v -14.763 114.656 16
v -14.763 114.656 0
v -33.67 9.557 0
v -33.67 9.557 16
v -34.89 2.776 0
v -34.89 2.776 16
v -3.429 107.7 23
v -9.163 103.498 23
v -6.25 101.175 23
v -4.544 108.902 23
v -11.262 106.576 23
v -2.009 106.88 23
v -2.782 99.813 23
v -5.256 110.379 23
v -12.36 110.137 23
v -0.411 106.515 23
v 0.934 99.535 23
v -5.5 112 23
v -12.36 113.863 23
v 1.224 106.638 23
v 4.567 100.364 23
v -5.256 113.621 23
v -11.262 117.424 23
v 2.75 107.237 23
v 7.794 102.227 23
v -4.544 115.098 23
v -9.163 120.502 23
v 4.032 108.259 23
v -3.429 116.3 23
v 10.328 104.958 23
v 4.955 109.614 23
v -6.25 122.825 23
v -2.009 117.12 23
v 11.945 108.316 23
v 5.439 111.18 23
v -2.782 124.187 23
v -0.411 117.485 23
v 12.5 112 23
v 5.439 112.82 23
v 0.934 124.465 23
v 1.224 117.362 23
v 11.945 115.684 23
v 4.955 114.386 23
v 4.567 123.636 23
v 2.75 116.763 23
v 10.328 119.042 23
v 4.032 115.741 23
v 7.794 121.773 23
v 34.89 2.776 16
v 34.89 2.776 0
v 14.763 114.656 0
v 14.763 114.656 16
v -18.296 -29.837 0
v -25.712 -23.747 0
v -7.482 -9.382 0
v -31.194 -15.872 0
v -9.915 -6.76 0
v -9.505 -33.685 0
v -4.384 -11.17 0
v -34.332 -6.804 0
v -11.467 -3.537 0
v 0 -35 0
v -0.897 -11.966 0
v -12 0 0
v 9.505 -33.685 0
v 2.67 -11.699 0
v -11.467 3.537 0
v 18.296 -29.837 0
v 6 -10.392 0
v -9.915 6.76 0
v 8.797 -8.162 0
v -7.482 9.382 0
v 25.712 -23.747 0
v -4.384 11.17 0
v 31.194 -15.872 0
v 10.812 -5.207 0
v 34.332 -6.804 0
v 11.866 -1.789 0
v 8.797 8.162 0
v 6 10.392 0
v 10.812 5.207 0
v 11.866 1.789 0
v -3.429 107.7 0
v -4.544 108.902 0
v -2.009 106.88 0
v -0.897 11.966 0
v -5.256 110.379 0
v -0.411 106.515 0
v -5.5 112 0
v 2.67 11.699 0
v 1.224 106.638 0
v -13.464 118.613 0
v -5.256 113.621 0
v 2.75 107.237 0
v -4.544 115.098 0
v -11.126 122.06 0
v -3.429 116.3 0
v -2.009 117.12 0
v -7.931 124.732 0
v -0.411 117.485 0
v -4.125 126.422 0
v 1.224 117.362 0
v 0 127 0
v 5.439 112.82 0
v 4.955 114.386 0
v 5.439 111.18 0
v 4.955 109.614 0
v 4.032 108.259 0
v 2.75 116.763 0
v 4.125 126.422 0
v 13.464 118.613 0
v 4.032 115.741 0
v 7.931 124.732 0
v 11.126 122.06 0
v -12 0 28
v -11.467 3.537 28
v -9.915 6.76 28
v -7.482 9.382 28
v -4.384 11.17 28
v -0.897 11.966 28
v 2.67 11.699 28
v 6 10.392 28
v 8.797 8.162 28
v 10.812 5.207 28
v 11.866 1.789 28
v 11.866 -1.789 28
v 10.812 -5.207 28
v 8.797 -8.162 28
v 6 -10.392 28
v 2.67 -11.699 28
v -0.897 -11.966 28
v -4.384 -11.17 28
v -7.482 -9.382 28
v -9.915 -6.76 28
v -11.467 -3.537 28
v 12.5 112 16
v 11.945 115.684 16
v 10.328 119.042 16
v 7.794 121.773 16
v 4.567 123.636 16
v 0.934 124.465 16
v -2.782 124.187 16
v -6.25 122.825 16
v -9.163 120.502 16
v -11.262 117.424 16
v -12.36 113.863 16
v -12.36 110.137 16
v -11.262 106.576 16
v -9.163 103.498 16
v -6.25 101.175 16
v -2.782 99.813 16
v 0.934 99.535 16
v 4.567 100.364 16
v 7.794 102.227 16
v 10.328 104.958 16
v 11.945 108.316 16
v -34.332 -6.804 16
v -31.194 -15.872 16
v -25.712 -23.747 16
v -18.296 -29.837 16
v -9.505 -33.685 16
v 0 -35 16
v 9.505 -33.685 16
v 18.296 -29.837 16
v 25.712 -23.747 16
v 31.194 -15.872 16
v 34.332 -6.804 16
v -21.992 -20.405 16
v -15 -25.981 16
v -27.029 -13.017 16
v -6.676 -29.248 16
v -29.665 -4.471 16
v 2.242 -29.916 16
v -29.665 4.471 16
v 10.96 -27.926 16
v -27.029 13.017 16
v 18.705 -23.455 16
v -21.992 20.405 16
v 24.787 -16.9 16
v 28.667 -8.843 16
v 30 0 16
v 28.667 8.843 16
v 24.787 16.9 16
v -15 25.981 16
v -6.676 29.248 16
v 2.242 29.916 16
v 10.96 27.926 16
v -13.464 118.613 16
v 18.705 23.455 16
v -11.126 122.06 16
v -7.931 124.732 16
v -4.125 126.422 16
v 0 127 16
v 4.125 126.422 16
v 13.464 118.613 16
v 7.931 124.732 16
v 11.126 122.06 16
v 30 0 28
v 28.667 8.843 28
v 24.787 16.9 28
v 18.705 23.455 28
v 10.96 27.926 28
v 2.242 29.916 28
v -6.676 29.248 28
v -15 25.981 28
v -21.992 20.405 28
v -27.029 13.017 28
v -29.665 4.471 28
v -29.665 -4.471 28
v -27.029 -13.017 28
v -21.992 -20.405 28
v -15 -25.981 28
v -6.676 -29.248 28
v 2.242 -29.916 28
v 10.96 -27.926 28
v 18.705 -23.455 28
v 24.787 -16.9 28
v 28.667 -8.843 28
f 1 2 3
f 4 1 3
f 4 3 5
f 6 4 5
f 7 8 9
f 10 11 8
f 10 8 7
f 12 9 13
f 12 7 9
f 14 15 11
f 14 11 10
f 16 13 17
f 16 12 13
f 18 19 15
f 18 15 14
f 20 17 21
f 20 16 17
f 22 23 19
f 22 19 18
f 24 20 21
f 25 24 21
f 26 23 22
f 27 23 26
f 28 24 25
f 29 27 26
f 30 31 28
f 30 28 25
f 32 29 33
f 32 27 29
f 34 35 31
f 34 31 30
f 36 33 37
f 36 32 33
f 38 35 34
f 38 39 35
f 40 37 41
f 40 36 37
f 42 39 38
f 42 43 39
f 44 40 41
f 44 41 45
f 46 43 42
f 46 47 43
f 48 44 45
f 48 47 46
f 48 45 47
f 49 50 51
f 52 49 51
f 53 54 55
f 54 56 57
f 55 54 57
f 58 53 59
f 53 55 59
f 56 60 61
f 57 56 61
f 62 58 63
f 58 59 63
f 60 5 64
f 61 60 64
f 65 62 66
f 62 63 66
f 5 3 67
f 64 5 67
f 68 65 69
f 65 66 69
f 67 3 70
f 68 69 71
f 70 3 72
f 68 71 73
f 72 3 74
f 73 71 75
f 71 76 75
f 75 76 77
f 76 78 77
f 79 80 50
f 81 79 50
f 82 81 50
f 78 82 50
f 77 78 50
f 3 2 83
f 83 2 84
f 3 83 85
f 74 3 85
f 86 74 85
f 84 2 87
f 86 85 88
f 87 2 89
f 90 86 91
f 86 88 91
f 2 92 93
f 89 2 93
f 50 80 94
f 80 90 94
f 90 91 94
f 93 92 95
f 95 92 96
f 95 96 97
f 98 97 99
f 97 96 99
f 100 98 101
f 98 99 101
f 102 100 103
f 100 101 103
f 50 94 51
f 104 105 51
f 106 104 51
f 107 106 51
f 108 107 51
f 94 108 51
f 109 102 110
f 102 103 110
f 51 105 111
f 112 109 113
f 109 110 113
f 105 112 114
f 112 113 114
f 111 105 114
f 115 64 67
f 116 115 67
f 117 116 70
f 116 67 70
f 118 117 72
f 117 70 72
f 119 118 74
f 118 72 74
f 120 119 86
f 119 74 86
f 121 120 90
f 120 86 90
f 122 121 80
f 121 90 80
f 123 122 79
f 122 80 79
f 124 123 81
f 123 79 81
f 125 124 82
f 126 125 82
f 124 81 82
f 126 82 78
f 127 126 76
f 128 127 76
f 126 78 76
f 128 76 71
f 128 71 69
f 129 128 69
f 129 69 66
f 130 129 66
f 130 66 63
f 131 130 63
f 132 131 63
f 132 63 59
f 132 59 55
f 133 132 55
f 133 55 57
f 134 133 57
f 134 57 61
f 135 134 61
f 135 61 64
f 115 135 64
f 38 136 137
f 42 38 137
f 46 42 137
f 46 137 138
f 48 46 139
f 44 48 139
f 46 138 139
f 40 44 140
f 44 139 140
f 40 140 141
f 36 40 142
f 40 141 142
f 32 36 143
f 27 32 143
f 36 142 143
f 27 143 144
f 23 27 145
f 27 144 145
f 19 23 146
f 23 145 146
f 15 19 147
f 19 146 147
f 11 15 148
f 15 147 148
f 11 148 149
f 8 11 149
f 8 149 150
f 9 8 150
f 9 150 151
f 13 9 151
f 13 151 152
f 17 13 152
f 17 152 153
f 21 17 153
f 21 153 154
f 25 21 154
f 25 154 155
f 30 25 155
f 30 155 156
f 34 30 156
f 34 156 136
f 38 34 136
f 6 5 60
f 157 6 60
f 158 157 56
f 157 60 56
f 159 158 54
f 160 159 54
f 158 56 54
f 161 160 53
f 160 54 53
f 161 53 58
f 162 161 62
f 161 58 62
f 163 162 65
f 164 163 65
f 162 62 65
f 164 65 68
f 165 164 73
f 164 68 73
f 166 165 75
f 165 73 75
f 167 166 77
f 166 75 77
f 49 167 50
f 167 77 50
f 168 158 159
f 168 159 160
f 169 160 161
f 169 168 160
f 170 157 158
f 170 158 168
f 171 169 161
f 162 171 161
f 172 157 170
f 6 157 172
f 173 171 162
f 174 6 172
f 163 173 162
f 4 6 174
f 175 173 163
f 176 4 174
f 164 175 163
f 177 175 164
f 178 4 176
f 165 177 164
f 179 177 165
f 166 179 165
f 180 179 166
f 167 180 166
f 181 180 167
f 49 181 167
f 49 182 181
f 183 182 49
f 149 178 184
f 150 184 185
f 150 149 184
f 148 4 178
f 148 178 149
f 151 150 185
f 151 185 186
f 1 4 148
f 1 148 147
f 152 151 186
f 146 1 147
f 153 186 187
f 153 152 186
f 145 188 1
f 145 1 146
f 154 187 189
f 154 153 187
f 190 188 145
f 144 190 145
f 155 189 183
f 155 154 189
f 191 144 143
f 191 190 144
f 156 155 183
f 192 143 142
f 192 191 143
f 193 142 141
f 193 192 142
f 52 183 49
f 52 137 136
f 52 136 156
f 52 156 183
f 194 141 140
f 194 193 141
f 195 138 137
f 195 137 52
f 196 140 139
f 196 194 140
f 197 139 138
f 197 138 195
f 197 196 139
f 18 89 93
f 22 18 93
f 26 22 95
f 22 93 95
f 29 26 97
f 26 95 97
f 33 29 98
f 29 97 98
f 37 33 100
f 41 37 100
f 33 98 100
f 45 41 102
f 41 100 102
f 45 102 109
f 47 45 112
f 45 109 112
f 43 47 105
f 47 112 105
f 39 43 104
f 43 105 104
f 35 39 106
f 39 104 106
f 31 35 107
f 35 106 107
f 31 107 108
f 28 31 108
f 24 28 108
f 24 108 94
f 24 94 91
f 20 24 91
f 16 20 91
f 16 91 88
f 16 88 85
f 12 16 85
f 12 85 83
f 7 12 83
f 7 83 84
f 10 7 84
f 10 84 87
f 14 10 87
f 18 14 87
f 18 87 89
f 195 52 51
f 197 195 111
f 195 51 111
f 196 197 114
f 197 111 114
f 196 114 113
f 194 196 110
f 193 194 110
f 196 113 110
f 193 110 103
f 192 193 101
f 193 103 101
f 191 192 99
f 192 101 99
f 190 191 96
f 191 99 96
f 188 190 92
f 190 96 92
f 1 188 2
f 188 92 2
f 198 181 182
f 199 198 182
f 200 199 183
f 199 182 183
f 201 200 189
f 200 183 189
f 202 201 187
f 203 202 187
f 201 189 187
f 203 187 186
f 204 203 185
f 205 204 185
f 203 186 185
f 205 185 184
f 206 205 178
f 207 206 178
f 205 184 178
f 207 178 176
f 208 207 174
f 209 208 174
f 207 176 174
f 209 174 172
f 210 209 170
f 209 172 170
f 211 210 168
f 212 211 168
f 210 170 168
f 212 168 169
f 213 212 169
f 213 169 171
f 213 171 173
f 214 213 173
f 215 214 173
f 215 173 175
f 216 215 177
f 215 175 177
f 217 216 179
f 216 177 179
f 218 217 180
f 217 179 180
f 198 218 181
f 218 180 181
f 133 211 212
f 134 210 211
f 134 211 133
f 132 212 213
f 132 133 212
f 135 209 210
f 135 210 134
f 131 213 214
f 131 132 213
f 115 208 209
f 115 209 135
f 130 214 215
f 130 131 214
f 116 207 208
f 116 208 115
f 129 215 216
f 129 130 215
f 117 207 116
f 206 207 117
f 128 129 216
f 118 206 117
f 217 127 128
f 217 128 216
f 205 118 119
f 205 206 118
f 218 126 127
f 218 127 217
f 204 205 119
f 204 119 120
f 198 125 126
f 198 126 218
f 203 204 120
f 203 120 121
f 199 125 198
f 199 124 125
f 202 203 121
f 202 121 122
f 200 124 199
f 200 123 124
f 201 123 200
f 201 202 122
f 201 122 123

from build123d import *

# Parameters (mm, degrees)
F1_DEPTH = 16
F2_R     = 12.5
F2_R_2   = 30
F3_DEPTH = 12
F5_D     = 24
F7_D     = 11
F8_R     = 12.5
F9_DEPTH = 5


with BuildPart() as f1:
    # F0 (on Top) → F1 (new body)
    with BuildSketch(Plane.XY):
        with BuildLine():
            Line((-14.763017, 114.655808), (-33.669786, 9.557486))
            Line((-33.669786, 9.557486), (-34.88973, 2.776097))
            ThreePointArc((-34.88973, 2.776097), (0, -35), (34.88973, 2.776097))
            Line((34.88973, 2.776097), (14.763017, 114.655808))
            ThreePointArc((14.763017, 114.655808), (0, 127), (-14.763017, 114.655808))
        make_face()
    extrude(amount=F1_DEPTH)

    # F2 (on face) → F3 (join)
    with BuildSketch(Plane.XY.offset(16)):
        with Locations((0, 112)):
            Circle(F2_R)
        Circle(F2_R_2)
    extrude(amount=F3_DEPTH)

    # F5 (through all)
    with Locations(Plane.XY.offset(28)):
        with Locations((0, 0)):
            Hole(F5_D / 2)

    # F7 (through all)
    with Locations(Plane.XY.offset(28)):
        with Locations((0, 112)):
            Hole(F7_D / 2)

    # F8 (on face) → F9 (cut)
    with BuildSketch(Plane.XY.offset(28)):
        with Locations((0, 112)):
            Circle(F8_R)
    extrude(amount=-F9_DEPTH, mode=Mode.SUBTRACT)


solid = f1.part
